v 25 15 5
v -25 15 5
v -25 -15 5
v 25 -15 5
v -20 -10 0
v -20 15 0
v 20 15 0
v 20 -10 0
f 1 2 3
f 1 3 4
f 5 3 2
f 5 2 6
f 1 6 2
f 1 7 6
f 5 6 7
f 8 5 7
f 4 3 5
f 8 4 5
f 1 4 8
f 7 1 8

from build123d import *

# Parameters (mm, degrees)
SKETCH1_W               = 50
SKETCH1_H               = 30
BOSS_EXTRUDE1_DEPTH     = 5
CUT_EXTRUDE3_DEPTH      = 1
CUT_EXTRUDE3_DEPTH_BACK = 31
CUT_EXTRUDE4_DEPTH      = 26
CUT_EXTRUDE4_DEPTH_BACK = 26


with BuildPart() as part:
    # Sketch1 → Boss-Extrude1 (new body)
    with BuildSketch(Plane.XY):
        Rectangle(SKETCH1_W, SKETCH1_H)
    extrude(amount=BOSS_EXTRUDE1_DEPTH)

    # Sketch4 → Cut-Extrude3 (cut, two sides)
    with BuildSketch(Plane(origin=(0, 15, 0), x_dir=(1, 0, 0), z_dir=(0, 1, 0))) as cut_extrude3_sk:
        Polygon((-25, -5), (-20, 0), (-25, 0), align=None)
        Polygon((25, -5), (20, 0), (25, 0), align=None)
    extrude(amount=CUT_EXTRUDE3_DEPTH, mode=Mode.SUBTRACT)
    extrude(cut_extrude3_sk.sketch, amount=-CUT_EXTRUDE3_DEPTH_BACK, mode=Mode.SUBTRACT)

    # Sketch5 → Cut-Extrude4 (cut, two sides)
    with BuildSketch(Plane(origin=(0, 0, 0), x_dir=(0, 0, -1), z_dir=(1, 0, 0))) as cut_extrude4_sk:
        Polygon((-5, -15), (0, -10), (0, -15), align=None)
    extrude(amount=CUT_EXTRUDE4_DEPTH, mode=Mode.SUBTRACT)
    extrude(cut_extrude4_sk.sketch, amount=-CUT_EXTRUDE4_DEPTH_BACK, mode=Mode.SUBTRACT)


solid = part.part
